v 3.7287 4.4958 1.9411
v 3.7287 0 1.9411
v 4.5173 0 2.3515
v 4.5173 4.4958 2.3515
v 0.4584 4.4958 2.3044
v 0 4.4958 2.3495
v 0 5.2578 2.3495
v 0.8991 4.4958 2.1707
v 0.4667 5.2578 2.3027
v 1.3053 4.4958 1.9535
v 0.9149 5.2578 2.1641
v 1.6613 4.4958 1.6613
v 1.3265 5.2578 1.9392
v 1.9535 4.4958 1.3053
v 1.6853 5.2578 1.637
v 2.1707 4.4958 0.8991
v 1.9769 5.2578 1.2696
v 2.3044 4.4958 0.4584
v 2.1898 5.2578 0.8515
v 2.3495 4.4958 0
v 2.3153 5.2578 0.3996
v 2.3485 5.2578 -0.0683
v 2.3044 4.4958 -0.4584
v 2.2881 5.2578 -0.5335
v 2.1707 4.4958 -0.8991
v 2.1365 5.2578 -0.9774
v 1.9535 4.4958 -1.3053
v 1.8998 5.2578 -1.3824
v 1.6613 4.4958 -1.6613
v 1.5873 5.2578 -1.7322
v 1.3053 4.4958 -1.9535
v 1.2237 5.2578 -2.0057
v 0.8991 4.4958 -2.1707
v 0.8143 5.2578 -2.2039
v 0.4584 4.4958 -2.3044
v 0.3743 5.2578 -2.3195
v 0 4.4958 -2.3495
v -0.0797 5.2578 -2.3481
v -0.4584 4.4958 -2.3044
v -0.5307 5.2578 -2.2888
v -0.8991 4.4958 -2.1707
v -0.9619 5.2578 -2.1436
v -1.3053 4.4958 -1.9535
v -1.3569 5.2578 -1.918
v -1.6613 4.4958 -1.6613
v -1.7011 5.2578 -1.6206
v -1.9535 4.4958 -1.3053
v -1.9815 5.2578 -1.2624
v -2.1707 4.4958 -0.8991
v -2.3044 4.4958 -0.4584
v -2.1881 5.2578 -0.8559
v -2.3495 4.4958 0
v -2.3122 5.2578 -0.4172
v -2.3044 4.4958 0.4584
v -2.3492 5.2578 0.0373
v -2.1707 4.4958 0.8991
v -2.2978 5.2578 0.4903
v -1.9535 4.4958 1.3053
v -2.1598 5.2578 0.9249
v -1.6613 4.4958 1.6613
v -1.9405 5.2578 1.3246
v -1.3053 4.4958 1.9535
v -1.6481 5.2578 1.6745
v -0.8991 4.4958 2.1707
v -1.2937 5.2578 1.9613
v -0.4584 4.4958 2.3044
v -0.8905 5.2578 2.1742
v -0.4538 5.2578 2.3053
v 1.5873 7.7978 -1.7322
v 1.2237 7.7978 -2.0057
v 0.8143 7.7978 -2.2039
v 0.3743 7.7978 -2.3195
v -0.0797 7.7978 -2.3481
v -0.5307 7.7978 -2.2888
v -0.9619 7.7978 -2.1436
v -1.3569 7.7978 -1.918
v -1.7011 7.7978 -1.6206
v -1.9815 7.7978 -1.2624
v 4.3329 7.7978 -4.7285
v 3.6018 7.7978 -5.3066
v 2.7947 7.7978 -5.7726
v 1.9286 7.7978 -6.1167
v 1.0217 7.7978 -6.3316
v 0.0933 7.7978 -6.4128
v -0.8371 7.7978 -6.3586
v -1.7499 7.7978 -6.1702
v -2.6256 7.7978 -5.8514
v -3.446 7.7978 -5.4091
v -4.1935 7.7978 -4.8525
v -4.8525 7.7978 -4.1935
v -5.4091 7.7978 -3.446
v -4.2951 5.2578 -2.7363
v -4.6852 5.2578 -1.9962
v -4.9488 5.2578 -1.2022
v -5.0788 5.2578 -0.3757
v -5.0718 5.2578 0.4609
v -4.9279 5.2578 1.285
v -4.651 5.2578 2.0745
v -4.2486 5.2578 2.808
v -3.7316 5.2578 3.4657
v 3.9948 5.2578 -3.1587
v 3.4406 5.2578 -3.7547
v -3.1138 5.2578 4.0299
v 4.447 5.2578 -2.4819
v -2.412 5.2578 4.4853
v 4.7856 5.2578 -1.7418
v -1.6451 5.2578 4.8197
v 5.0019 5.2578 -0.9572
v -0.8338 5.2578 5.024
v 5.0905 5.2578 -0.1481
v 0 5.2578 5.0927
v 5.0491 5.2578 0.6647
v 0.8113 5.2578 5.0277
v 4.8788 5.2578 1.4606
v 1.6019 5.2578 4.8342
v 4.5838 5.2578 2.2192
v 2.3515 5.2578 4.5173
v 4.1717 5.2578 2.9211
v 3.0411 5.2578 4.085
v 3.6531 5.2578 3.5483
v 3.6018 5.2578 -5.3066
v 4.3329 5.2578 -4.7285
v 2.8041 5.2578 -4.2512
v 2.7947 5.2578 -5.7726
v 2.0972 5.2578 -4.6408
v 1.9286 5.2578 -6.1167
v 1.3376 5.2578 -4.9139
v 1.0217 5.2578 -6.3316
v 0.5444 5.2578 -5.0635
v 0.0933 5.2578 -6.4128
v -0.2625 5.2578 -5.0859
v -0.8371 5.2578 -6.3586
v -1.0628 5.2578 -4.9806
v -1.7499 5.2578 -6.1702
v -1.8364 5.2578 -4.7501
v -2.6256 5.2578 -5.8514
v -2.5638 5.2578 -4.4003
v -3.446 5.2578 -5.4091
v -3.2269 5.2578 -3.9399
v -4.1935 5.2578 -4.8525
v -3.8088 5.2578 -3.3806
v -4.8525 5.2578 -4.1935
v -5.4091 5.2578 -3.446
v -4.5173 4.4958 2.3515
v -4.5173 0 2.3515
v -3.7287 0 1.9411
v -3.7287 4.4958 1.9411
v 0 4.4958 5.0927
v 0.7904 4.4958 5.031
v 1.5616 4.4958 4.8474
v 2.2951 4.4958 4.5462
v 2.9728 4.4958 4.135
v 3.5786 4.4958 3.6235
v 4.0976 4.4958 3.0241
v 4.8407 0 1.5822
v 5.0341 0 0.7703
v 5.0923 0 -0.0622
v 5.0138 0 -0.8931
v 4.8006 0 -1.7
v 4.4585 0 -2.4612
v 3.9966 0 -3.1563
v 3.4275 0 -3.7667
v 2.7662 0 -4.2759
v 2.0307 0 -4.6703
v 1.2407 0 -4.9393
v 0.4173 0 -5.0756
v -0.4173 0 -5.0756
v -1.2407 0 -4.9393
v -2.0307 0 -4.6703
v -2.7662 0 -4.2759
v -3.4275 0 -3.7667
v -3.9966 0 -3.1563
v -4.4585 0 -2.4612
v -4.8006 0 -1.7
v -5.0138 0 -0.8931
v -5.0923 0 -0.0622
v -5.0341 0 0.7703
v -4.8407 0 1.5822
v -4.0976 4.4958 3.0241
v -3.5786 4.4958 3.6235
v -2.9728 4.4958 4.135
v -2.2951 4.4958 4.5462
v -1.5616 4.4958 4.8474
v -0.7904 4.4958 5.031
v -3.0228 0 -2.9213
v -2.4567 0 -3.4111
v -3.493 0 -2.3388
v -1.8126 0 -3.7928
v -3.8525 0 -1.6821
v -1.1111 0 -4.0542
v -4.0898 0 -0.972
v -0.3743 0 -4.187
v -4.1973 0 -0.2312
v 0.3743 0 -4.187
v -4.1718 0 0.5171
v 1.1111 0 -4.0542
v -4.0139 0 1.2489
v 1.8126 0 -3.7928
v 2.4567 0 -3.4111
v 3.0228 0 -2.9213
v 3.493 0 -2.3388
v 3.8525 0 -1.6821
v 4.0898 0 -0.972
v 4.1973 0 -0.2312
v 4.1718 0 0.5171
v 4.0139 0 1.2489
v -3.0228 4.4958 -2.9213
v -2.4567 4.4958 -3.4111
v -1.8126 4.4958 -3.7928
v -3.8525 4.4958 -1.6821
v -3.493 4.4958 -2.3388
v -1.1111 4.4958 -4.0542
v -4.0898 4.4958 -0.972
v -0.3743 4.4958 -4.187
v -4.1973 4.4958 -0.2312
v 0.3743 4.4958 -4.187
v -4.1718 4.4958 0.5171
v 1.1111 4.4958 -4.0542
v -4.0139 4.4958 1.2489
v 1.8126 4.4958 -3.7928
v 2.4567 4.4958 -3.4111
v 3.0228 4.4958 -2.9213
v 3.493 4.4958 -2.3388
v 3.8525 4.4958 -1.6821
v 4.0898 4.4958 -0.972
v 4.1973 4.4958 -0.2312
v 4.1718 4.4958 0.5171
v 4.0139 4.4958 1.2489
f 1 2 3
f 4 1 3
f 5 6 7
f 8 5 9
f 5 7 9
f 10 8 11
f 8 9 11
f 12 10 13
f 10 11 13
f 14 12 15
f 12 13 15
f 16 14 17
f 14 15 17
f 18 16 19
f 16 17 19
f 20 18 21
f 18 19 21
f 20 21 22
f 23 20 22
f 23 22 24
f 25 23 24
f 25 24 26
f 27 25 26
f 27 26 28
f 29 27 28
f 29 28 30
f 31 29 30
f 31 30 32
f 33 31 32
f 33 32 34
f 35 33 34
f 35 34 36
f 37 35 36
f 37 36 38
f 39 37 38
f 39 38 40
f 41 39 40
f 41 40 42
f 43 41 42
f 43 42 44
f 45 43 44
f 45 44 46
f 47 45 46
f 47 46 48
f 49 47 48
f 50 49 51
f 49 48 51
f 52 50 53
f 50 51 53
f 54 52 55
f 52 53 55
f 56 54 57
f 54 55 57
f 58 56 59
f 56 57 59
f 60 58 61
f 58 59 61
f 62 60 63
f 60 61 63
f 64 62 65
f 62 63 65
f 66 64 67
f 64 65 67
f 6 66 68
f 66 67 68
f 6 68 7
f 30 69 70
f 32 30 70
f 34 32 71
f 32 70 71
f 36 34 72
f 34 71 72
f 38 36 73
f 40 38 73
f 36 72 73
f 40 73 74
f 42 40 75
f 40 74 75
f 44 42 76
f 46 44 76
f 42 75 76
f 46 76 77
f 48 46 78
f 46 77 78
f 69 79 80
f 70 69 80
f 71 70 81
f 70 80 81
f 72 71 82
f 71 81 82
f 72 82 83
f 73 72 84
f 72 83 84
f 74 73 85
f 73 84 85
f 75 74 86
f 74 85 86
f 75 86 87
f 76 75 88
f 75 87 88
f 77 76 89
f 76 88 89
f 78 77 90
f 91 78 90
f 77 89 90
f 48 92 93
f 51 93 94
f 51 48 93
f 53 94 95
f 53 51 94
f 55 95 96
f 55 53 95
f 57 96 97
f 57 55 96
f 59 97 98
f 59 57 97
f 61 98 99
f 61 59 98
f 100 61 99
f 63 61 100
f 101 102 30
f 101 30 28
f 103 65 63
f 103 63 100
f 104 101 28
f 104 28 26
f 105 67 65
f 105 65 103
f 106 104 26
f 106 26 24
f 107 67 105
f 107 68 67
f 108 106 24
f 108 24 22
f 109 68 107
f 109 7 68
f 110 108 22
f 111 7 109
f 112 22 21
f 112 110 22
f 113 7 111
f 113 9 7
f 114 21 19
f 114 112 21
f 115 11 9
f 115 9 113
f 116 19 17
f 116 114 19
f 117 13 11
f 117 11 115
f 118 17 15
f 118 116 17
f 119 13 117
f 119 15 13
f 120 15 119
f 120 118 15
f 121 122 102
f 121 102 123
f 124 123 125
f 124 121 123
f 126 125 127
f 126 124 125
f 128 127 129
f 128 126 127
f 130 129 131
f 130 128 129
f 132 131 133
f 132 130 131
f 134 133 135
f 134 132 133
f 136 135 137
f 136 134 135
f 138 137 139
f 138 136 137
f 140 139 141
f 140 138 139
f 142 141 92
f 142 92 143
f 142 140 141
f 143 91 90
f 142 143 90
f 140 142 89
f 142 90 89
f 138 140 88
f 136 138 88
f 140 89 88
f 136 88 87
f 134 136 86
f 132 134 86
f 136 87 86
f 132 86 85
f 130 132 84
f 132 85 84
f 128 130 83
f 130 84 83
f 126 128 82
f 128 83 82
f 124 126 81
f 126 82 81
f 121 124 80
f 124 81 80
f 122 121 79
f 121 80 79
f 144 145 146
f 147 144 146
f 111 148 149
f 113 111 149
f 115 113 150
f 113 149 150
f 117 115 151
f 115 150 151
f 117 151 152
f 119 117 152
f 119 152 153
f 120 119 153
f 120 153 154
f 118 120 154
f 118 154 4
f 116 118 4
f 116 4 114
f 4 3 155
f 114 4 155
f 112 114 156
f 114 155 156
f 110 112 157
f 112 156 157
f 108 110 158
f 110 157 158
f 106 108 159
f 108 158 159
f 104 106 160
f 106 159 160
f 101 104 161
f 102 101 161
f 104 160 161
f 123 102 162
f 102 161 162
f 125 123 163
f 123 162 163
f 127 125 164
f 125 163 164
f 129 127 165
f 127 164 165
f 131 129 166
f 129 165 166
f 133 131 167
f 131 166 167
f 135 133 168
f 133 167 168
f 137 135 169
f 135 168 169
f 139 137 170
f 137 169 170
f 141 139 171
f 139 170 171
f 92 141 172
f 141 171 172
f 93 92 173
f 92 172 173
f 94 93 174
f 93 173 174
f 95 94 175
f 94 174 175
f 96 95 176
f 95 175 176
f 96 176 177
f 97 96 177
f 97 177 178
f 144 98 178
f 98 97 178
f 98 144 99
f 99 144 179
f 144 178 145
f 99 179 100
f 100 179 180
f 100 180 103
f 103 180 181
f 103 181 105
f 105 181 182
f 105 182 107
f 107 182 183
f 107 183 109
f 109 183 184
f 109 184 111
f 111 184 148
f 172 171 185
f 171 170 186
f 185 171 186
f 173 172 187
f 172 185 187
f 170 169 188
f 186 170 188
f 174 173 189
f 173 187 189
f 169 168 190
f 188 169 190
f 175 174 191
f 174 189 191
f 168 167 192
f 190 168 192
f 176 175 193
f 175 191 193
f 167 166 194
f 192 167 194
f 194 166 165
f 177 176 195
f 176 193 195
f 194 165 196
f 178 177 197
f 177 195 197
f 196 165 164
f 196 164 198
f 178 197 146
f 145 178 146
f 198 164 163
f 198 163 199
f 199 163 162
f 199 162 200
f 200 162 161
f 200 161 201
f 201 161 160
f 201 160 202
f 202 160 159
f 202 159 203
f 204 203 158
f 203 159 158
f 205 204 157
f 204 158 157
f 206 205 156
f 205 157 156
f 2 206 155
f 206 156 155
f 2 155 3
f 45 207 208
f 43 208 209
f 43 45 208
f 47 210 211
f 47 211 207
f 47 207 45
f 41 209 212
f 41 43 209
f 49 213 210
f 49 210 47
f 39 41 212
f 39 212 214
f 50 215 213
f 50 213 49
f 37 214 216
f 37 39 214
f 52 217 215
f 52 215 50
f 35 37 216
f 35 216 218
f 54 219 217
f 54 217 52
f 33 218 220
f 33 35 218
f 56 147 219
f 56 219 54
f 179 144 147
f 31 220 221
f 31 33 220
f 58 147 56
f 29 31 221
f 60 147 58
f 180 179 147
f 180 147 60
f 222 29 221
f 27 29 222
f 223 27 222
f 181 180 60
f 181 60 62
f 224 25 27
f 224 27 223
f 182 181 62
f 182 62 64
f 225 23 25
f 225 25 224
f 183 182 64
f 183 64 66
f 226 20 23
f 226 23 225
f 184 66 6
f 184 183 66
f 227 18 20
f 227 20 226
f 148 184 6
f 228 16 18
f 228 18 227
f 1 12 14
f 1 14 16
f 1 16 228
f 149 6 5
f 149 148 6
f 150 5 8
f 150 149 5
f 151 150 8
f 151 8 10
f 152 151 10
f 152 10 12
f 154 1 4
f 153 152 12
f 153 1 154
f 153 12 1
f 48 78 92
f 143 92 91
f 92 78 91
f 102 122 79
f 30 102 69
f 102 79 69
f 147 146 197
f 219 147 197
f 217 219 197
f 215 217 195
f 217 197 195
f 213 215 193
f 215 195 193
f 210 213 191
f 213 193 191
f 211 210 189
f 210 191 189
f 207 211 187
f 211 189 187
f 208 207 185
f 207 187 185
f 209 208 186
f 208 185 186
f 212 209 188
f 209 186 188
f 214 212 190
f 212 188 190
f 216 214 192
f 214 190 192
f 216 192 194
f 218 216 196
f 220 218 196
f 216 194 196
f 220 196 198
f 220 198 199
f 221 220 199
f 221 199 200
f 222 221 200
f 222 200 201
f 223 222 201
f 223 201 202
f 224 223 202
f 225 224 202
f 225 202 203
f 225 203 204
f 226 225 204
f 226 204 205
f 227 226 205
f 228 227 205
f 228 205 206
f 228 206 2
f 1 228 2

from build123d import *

# Parameters (mm, degrees)
SKETCH1_R           = 5.0927
BOSS_EXTRUDE1_DEPTH = 5.2578
SKETCH2_R           = 2.3495
CUT_EXTRUDE1_DEPTH  = 9.917154671
SKETCH3_R           = 4.2037
CUT_EXTRUDE2_DEPTH  = 4.4958
CUT_EXTRUDE3_DEPTH  = 4.4958
BOSS_EXTRUDE2_START = 2.54
BOSS_EXTRUDE2_DEPTH = 2.54


with BuildPart() as part:
    # Sketch1 → Boss-Extrude1 (new body)
    with BuildSketch(Plane(origin=(0, 0, 0), x_dir=(1, 0, 0), z_dir=(0, 1, 0))):
        with Locations(Location((0, 0, 0), (0, 0, 270))):
            Circle(SKETCH1_R)
    extrude(amount=BOSS_EXTRUDE1_DEPTH)

    # Sketch2 → Cut-Extrude1 (cut, through all)
    with BuildSketch(Plane(origin=(0, 5.2578, 0), x_dir=(1, 0, 0), z_dir=(0, 1, 0))):
        with Locations(Location((0, 0, 0), (0, 0, 270))):
            Circle(SKETCH2_R)
    extrude(amount=-CUT_EXTRUDE1_DEPTH, mode=Mode.SUBTRACT)

    # Sketch3 → Cut-Extrude2 (cut)
    with BuildSketch(Plane.XZ):
        with Locations(Location((0, 0, 0), (0, 0, 270))):
            Circle(SKETCH3_R)
    extrude(amount=-CUT_EXTRUDE2_DEPTH, mode=Mode.SUBTRACT)

    # Sketch5 → Cut-Extrude3 (cut)
    with BuildSketch(Plane.XZ):
        with BuildLine():
            Line((0, 0), (4.51728007, 2.351547163))
            ThreePointArc((4.51728007, 2.351547163), (0, 5.0927), (-4.51728007, 2.351547163))
            Line((-4.51728007, 2.351547163), (0, 0))
        make_face()
    extrude(amount=-CUT_EXTRUDE3_DEPTH, mode=Mode.SUBTRACT)

    # Sketch4 → Boss-Extrude2 (add)
    with BuildSketch(Plane(origin=(0, 5.2578, 0), x_dir=(1, 0, 0), z_dir=(0, 1, 0)).offset(BOSS_EXTRUDE2_START)):
        with BuildLine():
            Line((4.332897797, 4.7285282), (1.587299193, 1.732233103))
            ThreePointArc((1.587299193, 1.732233103), (-0.306671289, 2.329399702), (-1.981548202, 1.26238543))
            Line((-1.981548202, 1.26238543), (-5.409091038, 3.445971038))
            ThreePointArc((-5.409091038, 3.445971038), (-0.837129734, 6.358631618), (4.332897797, 4.7285282))
        make_face()
    extrude(amount=-BOSS_EXTRUDE2_DEPTH)


solid = part.part
